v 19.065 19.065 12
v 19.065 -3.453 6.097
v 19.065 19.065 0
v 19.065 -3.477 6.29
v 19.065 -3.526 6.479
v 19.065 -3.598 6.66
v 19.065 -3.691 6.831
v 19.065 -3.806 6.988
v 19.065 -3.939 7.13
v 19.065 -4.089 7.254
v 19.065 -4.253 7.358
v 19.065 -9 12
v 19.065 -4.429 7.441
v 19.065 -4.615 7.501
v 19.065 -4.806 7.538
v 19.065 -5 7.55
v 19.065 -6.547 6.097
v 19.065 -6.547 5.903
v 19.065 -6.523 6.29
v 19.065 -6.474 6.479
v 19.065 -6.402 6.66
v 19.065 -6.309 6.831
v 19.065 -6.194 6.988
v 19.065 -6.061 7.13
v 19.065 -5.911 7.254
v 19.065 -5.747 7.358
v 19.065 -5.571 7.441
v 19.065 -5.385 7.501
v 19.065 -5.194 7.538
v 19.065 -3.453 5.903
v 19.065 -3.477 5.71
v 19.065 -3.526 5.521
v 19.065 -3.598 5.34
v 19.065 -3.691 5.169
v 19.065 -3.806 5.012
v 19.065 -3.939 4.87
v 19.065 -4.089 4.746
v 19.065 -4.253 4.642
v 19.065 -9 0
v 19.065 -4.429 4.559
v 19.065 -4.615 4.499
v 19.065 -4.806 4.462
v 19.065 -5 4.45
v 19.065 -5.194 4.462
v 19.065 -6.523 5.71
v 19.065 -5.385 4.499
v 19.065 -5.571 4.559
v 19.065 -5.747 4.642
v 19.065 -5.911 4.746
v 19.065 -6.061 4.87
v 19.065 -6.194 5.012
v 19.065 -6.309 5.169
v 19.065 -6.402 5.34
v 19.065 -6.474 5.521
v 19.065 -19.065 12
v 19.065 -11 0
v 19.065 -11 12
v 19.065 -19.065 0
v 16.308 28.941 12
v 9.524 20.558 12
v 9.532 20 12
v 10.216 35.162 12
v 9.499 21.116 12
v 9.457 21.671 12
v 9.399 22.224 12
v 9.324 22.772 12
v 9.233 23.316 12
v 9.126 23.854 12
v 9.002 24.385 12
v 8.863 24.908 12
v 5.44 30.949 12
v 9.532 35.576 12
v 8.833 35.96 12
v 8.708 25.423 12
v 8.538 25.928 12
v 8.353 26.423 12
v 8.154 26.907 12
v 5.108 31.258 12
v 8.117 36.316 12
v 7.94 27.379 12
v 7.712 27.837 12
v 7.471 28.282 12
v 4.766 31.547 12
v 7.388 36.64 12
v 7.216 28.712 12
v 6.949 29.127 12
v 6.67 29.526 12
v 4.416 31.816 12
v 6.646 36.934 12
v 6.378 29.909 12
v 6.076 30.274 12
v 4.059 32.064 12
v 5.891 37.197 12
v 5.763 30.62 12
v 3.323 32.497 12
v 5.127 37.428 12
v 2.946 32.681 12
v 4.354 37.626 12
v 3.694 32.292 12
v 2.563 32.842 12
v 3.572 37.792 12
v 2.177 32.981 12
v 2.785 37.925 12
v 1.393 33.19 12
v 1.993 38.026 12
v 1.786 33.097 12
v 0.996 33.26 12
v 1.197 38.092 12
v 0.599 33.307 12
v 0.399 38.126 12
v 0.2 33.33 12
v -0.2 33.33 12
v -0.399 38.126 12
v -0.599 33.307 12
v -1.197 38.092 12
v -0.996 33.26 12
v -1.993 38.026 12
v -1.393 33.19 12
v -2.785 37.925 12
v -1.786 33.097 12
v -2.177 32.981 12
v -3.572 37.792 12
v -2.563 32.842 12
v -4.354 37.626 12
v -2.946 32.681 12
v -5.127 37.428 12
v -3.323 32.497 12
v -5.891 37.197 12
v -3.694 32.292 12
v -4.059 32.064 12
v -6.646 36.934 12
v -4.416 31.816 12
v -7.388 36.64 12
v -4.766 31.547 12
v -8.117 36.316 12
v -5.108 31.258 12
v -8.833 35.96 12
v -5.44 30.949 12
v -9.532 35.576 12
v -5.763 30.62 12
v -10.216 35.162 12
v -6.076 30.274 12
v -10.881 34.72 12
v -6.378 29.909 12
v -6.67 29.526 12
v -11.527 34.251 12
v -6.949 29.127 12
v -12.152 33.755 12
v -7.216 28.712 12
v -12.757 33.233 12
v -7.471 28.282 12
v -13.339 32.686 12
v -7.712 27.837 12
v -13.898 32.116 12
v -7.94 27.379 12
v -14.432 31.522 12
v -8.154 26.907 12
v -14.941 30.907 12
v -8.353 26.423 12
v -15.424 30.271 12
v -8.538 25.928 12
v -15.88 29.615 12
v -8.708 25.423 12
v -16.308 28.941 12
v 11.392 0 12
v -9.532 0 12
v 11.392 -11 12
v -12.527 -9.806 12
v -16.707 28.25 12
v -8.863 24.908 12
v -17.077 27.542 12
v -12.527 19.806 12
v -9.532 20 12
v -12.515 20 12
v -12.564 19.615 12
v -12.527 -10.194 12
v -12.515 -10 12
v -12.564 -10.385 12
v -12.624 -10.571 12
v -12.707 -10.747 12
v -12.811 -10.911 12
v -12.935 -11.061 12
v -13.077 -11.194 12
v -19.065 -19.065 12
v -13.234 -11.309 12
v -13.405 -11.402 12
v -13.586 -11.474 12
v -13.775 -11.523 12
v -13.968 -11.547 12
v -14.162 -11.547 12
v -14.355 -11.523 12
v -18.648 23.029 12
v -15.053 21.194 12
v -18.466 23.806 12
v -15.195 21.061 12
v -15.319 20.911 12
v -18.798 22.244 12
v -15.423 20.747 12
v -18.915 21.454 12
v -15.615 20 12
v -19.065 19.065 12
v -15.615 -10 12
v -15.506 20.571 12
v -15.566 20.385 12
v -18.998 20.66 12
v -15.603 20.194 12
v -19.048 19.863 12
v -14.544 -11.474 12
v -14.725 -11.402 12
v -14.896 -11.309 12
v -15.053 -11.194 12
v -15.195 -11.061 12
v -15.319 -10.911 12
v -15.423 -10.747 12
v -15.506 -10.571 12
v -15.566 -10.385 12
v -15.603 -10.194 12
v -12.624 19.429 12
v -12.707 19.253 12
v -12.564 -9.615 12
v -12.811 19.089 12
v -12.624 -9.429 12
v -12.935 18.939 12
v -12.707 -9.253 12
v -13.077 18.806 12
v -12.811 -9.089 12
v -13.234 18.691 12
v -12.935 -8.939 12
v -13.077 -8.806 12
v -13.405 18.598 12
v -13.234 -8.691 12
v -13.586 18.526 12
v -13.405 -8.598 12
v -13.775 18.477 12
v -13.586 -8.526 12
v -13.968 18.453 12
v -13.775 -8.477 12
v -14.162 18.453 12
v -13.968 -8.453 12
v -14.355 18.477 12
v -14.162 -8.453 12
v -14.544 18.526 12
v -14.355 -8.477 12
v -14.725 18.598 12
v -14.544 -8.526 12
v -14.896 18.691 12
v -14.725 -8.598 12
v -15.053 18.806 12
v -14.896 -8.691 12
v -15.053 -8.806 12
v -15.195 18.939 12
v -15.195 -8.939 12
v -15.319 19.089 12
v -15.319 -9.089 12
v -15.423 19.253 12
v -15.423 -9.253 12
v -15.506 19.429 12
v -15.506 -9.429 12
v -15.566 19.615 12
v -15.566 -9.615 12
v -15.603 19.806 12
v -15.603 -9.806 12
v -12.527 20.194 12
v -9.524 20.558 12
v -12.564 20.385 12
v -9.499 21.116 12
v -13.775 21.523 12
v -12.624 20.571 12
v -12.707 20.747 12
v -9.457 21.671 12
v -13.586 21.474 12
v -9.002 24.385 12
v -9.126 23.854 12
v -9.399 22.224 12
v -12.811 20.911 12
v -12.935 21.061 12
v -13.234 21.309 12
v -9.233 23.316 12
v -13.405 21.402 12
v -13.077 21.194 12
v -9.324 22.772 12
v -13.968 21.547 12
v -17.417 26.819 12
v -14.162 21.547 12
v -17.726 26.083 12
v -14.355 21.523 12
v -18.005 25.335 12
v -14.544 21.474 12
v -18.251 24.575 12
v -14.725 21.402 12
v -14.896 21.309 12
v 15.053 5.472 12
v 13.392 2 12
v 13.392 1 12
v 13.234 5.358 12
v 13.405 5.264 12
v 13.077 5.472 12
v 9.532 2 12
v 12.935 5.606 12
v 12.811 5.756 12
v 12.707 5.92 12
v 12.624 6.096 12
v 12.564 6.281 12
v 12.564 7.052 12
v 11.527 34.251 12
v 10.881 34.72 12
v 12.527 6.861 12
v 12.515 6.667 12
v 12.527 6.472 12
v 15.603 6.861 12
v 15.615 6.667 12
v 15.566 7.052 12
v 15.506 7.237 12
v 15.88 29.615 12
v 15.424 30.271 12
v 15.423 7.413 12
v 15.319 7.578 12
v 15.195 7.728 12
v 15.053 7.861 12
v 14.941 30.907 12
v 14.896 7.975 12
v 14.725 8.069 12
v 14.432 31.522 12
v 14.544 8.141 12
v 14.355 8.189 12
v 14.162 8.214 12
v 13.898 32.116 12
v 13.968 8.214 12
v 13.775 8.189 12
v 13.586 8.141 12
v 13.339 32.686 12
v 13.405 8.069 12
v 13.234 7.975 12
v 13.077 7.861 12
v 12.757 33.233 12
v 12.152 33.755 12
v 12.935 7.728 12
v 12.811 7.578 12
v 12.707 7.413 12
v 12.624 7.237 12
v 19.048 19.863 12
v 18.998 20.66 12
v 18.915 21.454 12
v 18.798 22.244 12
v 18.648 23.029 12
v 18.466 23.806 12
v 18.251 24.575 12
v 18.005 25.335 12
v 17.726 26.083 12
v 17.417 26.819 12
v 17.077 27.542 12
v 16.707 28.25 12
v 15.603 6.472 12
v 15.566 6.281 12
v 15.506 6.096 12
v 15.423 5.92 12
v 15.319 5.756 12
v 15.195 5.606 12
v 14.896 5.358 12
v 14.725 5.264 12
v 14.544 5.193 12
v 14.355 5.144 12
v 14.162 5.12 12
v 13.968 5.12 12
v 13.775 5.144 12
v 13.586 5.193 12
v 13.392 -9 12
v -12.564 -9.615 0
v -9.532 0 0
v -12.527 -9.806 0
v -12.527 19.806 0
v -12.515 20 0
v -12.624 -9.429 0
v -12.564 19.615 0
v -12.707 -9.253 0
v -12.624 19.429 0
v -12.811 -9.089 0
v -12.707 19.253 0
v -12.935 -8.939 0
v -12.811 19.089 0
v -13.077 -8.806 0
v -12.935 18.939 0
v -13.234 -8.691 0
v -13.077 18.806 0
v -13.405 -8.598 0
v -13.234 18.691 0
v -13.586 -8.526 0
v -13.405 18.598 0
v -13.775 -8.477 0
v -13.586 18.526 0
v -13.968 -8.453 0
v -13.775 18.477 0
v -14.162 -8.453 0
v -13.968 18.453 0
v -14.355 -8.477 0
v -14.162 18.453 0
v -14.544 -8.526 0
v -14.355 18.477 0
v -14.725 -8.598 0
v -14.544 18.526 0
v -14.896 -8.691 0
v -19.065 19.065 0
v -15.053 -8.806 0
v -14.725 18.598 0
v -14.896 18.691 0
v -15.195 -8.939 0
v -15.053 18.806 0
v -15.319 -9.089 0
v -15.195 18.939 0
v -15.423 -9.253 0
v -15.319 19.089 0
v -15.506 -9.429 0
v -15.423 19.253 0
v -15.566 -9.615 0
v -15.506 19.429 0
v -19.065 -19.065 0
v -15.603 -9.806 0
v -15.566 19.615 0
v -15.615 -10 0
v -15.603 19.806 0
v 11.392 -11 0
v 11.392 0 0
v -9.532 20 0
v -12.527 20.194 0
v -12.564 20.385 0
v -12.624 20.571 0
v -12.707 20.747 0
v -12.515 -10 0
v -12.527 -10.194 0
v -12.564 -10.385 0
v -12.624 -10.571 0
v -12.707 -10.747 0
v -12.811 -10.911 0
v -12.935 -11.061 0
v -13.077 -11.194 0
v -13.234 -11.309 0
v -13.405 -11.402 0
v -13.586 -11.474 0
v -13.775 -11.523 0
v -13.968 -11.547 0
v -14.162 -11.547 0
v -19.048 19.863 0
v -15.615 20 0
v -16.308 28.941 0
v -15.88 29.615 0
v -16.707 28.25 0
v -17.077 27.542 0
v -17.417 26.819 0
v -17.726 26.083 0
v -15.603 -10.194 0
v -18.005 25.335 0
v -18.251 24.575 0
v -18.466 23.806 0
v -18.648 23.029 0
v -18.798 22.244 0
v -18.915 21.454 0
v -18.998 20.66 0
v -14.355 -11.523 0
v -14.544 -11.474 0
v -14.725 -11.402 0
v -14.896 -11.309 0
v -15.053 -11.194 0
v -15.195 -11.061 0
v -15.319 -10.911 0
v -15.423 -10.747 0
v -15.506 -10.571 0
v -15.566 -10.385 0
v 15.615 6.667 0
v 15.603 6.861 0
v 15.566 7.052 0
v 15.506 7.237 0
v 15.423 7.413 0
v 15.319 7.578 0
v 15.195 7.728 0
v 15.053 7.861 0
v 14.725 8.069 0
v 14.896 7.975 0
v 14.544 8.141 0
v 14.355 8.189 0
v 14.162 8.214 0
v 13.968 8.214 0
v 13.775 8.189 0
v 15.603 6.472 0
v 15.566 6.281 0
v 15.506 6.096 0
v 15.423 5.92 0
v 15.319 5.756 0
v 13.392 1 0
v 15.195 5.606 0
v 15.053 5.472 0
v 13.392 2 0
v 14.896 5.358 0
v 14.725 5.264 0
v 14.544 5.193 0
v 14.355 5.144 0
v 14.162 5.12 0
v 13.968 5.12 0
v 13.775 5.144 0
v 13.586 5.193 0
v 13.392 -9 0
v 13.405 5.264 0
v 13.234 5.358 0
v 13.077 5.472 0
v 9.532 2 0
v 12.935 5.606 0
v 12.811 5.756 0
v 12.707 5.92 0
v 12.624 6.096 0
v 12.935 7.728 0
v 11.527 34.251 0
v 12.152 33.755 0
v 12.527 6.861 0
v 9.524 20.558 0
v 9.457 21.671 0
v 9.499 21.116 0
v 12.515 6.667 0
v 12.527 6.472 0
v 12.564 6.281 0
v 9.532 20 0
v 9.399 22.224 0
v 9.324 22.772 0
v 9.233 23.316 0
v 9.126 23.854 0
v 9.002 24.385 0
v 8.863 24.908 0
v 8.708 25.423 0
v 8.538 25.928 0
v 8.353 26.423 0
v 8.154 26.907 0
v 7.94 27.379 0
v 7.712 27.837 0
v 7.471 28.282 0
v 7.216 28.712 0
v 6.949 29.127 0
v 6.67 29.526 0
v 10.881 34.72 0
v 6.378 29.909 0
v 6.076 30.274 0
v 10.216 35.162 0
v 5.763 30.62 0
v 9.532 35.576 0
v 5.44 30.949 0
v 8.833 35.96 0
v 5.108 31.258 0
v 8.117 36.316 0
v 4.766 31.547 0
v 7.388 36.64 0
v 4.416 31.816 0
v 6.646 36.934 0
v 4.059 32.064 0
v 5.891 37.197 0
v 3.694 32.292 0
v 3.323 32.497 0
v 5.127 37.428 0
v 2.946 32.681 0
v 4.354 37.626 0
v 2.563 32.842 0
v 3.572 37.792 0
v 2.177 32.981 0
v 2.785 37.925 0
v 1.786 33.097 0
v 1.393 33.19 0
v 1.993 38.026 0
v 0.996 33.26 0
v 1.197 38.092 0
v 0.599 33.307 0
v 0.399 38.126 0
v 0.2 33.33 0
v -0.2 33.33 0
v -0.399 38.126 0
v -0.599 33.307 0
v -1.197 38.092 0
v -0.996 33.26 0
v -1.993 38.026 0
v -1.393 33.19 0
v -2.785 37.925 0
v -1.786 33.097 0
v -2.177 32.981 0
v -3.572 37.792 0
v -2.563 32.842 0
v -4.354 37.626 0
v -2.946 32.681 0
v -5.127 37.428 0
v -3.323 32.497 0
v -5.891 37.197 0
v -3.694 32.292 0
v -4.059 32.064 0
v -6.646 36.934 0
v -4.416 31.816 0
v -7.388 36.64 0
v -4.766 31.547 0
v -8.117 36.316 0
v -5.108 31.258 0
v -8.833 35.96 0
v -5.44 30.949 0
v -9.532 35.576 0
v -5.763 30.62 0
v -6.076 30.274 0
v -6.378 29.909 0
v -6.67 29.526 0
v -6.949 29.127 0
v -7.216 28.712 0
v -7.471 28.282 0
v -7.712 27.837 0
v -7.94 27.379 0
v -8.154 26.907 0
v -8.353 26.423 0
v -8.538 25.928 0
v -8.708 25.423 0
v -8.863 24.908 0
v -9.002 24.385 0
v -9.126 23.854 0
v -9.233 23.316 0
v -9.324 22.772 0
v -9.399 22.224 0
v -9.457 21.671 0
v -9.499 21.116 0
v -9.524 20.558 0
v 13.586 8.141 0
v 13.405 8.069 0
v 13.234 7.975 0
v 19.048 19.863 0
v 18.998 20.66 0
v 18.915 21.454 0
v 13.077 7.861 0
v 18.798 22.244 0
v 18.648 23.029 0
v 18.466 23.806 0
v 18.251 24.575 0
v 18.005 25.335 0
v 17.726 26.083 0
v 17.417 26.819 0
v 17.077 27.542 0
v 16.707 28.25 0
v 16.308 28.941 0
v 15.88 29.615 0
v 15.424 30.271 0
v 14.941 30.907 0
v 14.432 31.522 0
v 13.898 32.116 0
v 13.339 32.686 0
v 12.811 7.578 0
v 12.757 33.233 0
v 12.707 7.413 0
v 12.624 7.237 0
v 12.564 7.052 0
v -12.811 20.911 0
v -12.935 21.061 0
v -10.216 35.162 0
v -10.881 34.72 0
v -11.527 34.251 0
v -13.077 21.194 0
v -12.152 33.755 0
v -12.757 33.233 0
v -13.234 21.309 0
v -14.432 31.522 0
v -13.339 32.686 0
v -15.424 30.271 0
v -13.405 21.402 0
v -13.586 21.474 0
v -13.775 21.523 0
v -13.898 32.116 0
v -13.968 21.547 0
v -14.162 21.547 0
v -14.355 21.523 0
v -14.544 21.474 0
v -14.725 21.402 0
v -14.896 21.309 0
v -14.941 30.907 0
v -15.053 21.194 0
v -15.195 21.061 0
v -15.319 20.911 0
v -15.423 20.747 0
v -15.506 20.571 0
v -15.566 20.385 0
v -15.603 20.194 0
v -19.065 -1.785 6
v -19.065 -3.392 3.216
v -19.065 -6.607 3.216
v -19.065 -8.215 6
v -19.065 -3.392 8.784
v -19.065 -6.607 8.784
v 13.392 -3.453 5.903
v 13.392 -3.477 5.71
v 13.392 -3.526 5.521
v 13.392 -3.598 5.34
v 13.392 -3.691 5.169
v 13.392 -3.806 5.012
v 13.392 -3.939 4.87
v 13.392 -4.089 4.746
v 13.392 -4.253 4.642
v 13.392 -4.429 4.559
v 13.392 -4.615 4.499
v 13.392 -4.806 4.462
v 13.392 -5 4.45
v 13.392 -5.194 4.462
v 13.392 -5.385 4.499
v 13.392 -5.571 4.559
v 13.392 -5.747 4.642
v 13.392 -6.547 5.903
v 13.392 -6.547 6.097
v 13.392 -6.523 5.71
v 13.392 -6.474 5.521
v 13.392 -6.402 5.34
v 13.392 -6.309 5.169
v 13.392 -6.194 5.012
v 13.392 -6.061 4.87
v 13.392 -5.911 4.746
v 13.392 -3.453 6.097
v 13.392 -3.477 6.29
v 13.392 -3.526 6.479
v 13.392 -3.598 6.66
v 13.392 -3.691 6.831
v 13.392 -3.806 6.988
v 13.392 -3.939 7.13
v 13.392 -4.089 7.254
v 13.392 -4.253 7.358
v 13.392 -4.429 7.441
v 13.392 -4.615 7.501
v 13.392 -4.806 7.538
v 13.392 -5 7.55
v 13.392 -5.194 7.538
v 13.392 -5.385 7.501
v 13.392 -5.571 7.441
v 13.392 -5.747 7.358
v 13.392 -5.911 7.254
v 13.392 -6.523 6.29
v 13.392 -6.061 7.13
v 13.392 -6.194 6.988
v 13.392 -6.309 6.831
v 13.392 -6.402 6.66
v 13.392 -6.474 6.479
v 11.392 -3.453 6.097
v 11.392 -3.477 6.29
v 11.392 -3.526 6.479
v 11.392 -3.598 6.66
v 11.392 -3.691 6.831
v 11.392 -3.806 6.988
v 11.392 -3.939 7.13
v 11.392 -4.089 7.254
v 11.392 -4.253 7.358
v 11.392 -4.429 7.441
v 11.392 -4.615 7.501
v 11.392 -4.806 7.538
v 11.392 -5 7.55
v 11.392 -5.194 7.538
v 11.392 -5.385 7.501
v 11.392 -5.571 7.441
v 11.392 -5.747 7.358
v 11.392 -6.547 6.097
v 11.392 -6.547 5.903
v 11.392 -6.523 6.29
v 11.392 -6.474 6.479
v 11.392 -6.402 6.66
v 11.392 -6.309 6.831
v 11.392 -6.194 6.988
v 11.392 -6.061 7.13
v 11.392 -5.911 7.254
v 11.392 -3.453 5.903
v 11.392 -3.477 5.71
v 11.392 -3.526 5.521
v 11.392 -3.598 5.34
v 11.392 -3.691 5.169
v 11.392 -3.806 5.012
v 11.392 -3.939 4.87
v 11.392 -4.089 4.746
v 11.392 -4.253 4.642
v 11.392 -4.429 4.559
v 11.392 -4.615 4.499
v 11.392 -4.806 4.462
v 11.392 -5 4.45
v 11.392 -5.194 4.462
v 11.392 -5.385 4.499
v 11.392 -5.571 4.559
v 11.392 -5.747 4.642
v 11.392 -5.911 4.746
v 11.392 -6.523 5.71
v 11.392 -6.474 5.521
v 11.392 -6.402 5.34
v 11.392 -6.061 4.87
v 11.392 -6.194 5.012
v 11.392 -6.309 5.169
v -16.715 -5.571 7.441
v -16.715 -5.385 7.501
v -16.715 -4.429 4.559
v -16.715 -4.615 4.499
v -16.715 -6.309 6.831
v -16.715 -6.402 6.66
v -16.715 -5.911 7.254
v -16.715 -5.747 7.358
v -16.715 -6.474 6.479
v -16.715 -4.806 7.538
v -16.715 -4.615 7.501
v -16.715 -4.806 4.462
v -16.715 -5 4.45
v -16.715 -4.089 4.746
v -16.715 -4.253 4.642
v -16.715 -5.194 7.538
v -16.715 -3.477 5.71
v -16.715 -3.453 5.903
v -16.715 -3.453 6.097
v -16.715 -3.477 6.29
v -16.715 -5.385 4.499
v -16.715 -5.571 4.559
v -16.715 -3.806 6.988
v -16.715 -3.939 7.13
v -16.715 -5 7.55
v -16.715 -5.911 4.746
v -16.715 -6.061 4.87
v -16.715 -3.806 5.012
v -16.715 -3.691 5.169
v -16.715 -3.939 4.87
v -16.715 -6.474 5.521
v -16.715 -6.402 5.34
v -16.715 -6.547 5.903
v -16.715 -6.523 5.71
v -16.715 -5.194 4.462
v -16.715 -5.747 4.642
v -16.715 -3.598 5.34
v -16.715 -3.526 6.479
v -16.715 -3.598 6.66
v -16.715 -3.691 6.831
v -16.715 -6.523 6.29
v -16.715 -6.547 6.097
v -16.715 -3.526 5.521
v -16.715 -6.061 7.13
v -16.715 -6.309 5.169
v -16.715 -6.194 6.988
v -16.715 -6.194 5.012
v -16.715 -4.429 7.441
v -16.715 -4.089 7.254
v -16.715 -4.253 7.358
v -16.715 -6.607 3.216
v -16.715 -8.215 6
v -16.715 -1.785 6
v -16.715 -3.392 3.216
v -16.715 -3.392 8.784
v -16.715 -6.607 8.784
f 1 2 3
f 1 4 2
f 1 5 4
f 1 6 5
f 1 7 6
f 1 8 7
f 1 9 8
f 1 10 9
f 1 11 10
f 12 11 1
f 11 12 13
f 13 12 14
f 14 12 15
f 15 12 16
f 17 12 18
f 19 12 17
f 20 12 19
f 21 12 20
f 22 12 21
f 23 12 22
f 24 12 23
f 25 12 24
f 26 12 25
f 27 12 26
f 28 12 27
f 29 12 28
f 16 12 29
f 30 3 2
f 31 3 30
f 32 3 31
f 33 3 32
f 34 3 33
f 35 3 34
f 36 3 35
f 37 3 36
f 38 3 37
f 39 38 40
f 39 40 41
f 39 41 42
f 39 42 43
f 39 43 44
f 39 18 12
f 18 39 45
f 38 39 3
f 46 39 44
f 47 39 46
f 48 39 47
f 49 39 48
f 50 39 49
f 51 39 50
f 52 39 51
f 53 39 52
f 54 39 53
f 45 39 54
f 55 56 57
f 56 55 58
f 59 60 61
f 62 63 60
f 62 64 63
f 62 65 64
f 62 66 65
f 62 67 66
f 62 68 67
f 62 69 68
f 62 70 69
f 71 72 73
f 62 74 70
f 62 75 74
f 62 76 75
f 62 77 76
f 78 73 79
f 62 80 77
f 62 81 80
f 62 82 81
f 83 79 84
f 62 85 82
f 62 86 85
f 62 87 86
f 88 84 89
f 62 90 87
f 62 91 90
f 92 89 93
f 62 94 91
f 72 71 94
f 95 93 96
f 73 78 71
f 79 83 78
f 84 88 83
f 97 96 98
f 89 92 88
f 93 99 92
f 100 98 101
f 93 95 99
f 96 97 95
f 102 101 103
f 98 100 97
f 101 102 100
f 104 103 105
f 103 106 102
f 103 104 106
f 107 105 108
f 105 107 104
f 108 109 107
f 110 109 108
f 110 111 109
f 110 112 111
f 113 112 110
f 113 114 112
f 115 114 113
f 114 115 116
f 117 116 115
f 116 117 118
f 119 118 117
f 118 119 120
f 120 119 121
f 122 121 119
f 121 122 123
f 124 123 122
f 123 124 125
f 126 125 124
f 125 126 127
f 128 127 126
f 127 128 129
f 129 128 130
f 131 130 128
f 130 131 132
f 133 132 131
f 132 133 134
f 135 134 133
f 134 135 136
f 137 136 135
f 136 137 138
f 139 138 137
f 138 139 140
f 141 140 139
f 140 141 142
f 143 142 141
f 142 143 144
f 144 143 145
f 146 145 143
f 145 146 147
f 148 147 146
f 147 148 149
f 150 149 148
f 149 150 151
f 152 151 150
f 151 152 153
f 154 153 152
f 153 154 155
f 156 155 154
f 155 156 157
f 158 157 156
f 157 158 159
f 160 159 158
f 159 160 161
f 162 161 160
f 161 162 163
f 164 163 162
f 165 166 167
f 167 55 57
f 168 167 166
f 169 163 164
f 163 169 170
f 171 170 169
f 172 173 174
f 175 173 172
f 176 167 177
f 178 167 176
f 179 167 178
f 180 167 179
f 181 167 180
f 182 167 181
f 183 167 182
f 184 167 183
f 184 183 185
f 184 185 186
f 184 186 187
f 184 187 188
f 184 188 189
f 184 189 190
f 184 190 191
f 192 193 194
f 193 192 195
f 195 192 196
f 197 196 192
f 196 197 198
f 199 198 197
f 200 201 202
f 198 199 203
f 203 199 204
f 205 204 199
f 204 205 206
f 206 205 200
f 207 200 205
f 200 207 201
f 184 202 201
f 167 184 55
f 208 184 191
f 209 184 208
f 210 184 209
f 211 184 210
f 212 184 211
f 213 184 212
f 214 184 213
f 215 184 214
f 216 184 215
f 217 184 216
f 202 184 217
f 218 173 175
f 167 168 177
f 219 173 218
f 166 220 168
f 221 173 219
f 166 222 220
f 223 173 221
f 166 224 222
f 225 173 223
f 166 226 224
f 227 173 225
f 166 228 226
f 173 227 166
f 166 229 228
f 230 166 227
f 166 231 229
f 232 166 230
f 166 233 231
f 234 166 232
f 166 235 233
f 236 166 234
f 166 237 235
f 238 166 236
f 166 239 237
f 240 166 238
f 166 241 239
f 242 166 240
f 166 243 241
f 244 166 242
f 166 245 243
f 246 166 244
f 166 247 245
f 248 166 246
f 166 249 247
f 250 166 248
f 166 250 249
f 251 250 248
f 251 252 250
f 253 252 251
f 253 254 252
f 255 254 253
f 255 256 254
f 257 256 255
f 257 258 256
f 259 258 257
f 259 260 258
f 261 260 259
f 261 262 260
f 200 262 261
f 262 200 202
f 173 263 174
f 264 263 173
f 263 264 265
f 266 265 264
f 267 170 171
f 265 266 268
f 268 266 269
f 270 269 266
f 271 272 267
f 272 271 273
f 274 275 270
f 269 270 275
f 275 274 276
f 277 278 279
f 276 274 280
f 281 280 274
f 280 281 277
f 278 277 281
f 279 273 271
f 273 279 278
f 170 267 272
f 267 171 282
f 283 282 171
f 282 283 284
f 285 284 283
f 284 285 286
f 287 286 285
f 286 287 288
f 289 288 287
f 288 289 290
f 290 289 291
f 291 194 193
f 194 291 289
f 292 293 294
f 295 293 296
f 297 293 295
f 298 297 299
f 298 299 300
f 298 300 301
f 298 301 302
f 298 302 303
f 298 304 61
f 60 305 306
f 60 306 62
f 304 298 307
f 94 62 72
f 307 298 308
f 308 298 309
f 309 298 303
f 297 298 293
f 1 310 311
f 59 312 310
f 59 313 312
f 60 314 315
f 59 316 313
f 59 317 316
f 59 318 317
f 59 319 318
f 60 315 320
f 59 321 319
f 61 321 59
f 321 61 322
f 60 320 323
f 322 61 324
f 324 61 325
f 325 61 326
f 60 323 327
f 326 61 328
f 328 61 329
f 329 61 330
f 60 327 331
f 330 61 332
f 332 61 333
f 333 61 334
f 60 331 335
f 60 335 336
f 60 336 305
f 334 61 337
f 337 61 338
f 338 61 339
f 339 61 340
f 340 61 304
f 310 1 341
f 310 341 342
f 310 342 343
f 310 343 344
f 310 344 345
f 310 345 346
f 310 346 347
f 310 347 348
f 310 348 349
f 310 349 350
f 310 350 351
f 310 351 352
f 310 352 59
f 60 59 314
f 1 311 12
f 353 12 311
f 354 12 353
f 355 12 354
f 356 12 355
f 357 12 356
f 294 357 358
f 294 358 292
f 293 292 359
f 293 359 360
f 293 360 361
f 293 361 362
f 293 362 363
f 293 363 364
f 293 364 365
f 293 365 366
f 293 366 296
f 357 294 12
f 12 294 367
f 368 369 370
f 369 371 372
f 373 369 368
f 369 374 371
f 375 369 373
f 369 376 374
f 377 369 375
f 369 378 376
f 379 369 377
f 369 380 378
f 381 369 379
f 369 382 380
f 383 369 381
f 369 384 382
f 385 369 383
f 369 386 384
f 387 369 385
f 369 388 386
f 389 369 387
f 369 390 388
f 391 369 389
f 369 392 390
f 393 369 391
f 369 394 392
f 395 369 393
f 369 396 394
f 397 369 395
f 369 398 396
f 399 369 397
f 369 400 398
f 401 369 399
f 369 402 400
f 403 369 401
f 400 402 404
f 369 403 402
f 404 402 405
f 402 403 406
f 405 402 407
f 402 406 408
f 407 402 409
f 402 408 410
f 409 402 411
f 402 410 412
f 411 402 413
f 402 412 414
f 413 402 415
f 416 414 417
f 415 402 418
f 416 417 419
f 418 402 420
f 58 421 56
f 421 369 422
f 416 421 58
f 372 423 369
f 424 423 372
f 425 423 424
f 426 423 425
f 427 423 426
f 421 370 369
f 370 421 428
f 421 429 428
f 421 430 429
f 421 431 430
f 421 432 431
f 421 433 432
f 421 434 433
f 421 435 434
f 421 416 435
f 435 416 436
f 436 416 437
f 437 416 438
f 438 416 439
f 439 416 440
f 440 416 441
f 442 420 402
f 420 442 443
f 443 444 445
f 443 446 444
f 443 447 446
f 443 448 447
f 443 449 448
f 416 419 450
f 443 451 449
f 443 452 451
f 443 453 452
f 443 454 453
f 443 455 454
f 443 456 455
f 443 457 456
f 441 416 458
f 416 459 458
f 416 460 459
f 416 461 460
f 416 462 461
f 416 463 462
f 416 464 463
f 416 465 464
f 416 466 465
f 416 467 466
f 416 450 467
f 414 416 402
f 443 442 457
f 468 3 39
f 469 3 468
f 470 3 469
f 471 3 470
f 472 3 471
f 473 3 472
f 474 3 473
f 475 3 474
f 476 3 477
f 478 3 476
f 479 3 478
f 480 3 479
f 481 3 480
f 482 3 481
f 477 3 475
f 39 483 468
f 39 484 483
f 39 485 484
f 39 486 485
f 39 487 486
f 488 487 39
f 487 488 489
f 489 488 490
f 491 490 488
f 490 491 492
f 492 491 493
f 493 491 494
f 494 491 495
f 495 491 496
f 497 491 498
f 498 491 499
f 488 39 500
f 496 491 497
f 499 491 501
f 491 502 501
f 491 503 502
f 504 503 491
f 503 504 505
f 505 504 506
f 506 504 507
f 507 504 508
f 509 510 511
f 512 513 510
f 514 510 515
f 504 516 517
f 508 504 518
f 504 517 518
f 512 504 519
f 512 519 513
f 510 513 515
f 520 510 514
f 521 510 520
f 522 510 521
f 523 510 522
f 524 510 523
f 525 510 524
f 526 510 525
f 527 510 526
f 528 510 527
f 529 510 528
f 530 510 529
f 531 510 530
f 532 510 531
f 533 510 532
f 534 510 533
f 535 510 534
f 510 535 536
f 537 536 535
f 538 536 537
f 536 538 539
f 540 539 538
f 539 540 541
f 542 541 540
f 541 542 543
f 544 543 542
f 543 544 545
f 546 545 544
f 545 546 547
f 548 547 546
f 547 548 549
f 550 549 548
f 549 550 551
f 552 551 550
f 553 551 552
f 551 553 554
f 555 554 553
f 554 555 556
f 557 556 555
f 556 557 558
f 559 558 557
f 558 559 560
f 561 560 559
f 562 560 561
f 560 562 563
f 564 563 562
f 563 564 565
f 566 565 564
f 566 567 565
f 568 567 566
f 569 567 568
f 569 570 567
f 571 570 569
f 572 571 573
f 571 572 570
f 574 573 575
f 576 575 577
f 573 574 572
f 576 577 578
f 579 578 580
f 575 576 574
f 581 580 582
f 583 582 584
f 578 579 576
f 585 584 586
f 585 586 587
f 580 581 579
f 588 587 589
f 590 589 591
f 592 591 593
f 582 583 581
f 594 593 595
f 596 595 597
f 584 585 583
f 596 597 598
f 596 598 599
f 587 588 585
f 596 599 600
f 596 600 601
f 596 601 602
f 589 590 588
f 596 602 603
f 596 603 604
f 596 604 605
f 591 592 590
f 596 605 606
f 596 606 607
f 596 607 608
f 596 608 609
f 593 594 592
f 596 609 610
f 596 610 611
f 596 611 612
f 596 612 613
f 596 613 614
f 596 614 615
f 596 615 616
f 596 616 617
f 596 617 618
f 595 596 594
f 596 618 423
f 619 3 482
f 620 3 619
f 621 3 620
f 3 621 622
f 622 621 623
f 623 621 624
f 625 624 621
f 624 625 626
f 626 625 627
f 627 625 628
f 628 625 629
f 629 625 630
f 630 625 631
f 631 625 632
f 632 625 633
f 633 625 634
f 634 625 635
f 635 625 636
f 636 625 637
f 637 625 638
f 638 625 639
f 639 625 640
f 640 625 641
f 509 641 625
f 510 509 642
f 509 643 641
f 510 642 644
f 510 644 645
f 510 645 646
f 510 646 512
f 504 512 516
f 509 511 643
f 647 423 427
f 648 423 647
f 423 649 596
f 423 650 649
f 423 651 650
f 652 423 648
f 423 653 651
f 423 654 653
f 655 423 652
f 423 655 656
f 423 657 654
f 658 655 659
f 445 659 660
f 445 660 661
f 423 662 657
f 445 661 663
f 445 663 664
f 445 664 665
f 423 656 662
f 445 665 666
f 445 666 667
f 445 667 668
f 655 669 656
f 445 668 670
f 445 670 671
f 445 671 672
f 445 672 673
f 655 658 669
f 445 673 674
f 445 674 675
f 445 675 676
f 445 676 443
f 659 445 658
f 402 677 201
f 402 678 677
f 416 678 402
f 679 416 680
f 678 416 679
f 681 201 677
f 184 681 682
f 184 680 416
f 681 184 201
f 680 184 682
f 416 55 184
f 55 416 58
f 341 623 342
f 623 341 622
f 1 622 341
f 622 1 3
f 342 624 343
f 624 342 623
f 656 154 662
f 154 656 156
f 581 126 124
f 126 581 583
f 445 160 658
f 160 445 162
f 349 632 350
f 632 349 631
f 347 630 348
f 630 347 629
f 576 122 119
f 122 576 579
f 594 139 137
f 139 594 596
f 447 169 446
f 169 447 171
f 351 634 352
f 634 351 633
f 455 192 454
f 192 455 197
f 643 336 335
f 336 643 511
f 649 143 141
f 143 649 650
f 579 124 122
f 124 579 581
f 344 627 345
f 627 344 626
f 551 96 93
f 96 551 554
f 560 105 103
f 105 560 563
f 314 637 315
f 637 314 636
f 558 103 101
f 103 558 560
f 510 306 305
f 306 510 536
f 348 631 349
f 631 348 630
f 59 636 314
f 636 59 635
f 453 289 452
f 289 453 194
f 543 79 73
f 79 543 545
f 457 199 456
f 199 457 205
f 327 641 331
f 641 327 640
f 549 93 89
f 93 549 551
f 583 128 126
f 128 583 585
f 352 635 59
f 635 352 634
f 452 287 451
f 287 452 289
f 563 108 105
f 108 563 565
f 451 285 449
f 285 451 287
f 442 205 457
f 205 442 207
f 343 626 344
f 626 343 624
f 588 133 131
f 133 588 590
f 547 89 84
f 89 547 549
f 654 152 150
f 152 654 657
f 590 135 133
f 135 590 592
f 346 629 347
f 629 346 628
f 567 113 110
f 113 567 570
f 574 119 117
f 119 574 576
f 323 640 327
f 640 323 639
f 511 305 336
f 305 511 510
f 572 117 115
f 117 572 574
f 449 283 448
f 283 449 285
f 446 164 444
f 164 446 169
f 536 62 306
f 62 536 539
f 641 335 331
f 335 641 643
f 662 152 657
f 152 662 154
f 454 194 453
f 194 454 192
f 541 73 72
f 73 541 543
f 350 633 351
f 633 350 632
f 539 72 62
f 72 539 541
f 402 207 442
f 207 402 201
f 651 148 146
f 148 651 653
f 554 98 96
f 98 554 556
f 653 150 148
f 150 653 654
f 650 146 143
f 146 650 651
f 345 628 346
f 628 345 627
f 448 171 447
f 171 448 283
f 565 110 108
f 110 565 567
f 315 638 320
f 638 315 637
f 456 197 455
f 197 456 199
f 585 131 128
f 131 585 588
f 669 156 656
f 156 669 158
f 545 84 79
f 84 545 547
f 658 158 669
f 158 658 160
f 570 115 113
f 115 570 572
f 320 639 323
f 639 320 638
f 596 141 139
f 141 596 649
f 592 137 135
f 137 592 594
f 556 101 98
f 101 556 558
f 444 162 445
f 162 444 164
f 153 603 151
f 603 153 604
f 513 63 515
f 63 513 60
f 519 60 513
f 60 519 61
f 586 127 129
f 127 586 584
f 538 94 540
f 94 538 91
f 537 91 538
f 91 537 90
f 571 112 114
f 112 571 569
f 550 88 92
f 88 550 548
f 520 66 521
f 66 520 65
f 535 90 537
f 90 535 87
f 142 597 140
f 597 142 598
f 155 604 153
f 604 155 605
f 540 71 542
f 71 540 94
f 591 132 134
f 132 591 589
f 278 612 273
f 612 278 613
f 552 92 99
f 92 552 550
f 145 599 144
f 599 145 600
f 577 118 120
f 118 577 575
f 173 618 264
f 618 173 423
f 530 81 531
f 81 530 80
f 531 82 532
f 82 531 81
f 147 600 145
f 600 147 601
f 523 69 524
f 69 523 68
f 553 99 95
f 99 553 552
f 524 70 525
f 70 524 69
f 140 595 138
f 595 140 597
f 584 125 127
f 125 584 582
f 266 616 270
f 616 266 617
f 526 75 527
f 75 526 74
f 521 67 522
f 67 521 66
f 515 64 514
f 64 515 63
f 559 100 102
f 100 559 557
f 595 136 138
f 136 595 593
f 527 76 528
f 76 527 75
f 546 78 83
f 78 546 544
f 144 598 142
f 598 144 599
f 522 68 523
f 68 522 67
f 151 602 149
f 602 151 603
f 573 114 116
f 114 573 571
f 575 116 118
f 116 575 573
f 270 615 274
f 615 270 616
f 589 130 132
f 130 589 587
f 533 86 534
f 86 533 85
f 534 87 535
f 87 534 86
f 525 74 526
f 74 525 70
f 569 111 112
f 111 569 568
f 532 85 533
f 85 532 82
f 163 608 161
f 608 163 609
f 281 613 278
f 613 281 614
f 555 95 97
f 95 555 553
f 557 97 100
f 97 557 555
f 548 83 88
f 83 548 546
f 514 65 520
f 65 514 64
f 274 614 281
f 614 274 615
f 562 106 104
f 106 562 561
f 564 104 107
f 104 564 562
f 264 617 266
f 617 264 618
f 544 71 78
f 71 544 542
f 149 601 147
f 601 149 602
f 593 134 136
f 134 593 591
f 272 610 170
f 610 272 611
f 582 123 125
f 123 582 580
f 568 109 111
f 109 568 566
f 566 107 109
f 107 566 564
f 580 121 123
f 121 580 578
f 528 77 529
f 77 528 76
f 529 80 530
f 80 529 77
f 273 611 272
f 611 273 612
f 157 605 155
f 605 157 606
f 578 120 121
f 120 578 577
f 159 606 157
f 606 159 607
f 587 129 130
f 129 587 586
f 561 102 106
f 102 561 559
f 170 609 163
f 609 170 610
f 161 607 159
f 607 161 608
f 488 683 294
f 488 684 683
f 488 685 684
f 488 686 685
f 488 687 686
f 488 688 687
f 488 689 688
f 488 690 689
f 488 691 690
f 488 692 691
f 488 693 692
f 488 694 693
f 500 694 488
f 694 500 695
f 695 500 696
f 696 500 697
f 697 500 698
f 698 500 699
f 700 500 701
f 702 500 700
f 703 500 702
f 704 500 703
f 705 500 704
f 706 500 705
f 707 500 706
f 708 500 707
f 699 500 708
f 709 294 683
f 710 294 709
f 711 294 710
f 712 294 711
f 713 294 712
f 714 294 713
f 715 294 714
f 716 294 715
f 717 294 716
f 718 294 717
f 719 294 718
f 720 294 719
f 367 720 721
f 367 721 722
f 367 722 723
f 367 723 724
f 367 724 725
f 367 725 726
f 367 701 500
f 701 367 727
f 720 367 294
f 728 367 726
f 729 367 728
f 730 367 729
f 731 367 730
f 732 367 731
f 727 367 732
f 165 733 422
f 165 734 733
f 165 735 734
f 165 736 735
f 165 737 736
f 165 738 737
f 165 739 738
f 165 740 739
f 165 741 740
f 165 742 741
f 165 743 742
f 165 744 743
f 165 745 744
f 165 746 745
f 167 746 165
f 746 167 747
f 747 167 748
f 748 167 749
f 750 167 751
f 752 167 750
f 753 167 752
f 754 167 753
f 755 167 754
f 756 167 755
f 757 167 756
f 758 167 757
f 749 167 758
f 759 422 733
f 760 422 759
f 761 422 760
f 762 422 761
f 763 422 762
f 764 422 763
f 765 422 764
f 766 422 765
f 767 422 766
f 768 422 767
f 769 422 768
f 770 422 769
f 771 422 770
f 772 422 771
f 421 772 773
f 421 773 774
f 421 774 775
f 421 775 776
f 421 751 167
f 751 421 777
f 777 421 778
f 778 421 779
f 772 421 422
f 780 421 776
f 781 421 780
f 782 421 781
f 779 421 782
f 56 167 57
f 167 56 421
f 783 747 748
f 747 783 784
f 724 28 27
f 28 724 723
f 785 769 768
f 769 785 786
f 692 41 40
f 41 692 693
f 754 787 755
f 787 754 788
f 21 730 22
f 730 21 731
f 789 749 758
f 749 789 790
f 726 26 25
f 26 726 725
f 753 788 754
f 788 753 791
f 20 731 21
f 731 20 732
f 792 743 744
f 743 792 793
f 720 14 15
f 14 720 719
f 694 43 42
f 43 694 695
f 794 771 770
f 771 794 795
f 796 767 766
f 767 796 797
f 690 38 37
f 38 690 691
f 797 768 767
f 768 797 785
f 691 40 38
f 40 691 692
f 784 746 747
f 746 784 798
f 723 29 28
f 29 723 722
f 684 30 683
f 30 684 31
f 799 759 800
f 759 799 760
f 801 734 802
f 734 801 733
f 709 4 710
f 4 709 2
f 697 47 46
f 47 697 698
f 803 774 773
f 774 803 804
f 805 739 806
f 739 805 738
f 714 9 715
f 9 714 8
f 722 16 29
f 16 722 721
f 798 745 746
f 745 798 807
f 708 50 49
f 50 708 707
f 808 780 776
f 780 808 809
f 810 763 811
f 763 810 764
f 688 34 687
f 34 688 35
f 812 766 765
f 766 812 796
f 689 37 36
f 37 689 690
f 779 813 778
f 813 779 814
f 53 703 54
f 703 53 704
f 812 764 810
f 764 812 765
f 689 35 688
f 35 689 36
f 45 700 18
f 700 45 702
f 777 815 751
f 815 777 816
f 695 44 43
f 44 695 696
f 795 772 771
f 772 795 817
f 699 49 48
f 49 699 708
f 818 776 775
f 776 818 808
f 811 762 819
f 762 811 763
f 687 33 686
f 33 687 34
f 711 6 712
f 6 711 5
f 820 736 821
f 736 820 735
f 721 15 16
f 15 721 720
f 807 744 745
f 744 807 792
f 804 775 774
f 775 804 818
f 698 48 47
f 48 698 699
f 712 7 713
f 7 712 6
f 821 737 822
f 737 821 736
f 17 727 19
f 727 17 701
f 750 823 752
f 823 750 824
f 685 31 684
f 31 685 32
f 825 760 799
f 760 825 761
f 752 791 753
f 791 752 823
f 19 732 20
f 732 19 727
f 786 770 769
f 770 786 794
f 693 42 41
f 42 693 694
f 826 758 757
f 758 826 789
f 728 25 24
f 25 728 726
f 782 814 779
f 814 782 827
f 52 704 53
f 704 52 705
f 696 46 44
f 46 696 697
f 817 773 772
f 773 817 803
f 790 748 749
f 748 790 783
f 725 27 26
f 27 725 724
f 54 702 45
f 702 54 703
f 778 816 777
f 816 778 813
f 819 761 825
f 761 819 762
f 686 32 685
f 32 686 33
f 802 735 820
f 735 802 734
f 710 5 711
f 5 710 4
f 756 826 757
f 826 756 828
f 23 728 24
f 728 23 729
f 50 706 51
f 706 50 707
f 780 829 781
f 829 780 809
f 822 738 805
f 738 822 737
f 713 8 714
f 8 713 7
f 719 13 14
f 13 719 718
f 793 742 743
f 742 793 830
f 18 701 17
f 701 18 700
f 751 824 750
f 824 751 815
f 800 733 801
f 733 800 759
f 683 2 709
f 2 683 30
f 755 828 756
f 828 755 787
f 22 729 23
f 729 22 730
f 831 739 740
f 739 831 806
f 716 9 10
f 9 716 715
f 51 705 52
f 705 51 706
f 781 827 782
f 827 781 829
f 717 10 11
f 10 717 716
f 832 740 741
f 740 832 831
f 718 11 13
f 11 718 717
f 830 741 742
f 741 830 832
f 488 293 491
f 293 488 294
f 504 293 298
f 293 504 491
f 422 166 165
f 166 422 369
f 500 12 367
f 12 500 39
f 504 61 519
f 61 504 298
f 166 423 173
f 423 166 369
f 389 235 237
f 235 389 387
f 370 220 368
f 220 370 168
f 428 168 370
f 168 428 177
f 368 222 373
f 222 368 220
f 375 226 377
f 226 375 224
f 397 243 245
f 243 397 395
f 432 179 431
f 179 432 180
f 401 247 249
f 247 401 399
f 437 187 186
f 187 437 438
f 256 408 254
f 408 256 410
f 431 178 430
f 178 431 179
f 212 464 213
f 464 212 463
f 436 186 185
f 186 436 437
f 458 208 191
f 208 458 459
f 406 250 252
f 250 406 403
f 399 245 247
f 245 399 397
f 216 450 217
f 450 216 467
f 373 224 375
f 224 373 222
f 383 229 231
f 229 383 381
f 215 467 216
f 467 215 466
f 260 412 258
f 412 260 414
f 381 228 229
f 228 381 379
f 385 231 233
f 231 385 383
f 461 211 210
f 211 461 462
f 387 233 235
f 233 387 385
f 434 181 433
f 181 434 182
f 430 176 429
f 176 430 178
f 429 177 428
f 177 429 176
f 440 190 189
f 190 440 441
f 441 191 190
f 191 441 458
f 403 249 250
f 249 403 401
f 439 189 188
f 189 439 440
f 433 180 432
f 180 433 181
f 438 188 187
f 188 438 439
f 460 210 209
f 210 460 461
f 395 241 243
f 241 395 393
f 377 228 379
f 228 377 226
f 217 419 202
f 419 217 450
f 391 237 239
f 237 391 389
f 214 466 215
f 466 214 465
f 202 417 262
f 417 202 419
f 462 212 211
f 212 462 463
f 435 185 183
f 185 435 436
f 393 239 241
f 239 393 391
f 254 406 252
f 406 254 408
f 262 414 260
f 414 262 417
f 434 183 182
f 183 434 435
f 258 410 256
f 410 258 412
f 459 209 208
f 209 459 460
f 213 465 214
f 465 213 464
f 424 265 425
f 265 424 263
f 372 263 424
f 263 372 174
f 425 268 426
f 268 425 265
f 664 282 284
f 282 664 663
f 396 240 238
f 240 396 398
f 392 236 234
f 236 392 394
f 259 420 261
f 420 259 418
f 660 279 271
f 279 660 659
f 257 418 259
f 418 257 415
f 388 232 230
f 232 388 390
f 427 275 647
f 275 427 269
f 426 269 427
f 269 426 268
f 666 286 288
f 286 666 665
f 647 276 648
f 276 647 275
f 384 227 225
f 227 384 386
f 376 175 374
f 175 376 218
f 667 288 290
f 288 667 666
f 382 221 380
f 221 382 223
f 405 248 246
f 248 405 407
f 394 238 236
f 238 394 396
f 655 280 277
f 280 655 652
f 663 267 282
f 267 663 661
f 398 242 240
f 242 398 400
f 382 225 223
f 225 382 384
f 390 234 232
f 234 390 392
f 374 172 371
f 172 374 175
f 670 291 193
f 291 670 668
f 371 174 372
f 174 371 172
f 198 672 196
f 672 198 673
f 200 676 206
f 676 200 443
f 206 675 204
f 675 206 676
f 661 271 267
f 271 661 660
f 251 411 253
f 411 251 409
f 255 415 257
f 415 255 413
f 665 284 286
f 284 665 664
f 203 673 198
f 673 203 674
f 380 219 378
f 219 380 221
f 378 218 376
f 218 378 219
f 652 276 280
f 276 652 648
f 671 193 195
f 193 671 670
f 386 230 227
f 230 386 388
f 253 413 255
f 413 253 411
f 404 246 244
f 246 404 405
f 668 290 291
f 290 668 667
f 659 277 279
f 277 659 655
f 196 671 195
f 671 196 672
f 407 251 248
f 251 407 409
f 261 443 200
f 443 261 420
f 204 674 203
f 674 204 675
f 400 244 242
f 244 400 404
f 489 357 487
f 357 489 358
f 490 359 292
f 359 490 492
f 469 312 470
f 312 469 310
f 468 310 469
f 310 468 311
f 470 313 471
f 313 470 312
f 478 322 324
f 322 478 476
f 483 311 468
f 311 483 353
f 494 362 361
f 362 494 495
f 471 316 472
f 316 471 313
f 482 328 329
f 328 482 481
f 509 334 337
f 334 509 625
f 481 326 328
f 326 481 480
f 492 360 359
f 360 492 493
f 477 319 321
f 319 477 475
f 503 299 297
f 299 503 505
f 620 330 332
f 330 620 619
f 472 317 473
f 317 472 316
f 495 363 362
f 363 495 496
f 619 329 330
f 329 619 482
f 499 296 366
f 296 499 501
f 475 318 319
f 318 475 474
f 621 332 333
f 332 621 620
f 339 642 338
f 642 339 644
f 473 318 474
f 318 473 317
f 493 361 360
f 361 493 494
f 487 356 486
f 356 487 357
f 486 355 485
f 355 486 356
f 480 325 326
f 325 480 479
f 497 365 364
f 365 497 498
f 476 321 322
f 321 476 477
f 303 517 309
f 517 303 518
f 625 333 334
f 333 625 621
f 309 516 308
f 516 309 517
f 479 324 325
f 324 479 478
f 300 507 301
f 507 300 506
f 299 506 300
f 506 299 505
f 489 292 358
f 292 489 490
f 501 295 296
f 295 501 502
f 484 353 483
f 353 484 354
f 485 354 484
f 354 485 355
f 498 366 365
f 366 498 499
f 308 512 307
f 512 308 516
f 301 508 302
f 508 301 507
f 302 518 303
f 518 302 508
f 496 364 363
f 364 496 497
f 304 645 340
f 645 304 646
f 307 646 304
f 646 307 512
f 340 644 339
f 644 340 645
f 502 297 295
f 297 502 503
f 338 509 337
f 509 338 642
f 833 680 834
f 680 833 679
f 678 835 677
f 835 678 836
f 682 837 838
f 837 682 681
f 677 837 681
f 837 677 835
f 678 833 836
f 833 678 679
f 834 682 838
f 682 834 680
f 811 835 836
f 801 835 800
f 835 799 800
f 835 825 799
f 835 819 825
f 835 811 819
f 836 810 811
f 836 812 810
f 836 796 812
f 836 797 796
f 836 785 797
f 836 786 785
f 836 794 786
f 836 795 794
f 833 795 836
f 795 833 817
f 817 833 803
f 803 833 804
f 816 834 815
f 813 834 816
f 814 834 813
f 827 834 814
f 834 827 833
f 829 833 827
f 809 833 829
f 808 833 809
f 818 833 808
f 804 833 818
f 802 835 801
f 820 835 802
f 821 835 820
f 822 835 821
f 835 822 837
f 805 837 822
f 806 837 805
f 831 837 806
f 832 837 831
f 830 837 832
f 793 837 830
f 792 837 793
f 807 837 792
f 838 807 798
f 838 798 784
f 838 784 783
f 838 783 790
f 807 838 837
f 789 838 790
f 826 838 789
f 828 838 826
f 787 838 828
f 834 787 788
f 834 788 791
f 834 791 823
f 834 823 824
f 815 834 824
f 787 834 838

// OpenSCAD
// Cerberus Pup-style carriage for Kossel, compatible with Kossel Mini/Pro linear rails

// Steve Graber made the original design.
// Daniel Akesson converted the original into OpenSCAD.
// Brandon Heller tweaked the OpenSCAD to:
// - be compatible with linear rails (thicker, w/20x20 m3 mounting grid)
// - decouple rod mounts from the carriage, and be compatible with the Kosssel effector.

// Kossel Pro and Mini ball rails equivalent to HIWIN Model MGN 12H:
// http://hiwin.com/html/extras/mgn-c_mgn-h.html
// Distance from ball rail attachment plane to outer face of slider, marked H.
ball_rail_H = 13;

// This is the key dimension to enable rail compatibility.
// With the Graber double-623 V-wheels, an m3 nut plus a washer gives ~1mm of clearance.
carriage_extrusion_dist = 1;
main_height = ball_rail_H - carriage_extrusion_dist;

// Presumably, this carriage will ride on an extrusion.
// Measured width of OpenBeam, slightly less than actual 15mm.
extrusion_width = 14.90;
roller_dia = 15.57;  // Measured diameter of 3 different Grabercars double 623 w-wheels.
roller_r = roller_dia / 2;
// Using calipers, measure from the edge of the extrusion to side of the wheel.
// This dimension must be slightly less than the sum of the extrusion width + roller dia. 
wheel_extrusion_len = 29.60;
// extra_squeeze helps to ensure that the rollers makes contact with the beam
// before tightening the tensioning screw, even if any measurements are off,
// screw holes for the rollers are drilled at a skewed angle, or screw holes are
// slightly enlarged and enable the screws to splay out a bit under tension.
// The ~2mm of screw adjustment from the slot is not a lot, and it's better
// to have the beam w/the single roller stretch out than to not get enough
// tension.
extra_squeeze = 0.3;
roller_x_offset = wheel_extrusion_len - roller_r - (extrusion_width / 2) - extra_squeeze;
beam_width = 10.0;
main_cube_width = (roller_x_offset + beam_width / 2) * 2;
main_cube_length = 40;
rod_fastener_height = 10 + main_height;
rod_fastener_width = 14;
rod_fastener_length = 9;

round_r = 3.8;
pad = 0.1;
smooth = 50;
main_curve_smooth = 150;

rod_offset = 3;

bearing_inset = 1.5;

cut_width = 2;  // Width of cut
minimal_cut = (main_cube_width/4)*0.3;  // Larger values move the main cut (in the y dir) outwards.
rest_cut = (main_cube_width/4)*0.7; // Distance to make the cut that exits the outside of the carriage.

m3_nut_slop = 0.25;  // Account for inability for layer height to exactly match nut width.
m3_nut_dia = 6.18 + m3_nut_slop;
m3_nut_r = m3_nut_dia / 2;
m3_nut_thickness = 2.35;

m3_screw_slop = 0.1;
m3_screw_dia = 3.0 + m3_screw_slop;
m3_screw_r = m3_screw_dia / 2;
m3_screw_head_slop = 0.3;
m3_screw_head_r = 5.5/2 + m3_screw_head_slop;

delta = 0.01;  // Small value to avoid visual artifacts for coincident surfaces.

module oval(w,h, height, center = false) {
  scale([1, h/w, 1]) cylinder(h=height, r=w, $fn=main_curve_smooth, center=center);
}

module main_part()
{
  cube([main_cube_width, main_cube_width, main_height], center = true);
  translate([0, main_cube_width/2, 0]) {
    cylinder(r=main_cube_width/2, h=main_height, $fn=main_curve_smooth, center = true);
  }
}

module cut()
{
  translate([main_cube_width/4+minimal_cut/2, cut_width/2, 0]) {
    cube([minimal_cut+cut_width, cut_width, main_height + 2], center = true);
  }
  translate([main_cube_width/4+minimal_cut, -main_cube_length/8, 0]) {
    cube([cut_width, main_cube_length/4+cut_width, main_height + 2], center = true);
    rotate([0, 90, 0]) {
      cylinder(r=m3_screw_r, h=100, $fn=smooth, center = true);
    }
  }
  translate([main_cube_width/4+rest_cut, -main_cube_length/4, 0]) {
    cube([rest_cut, cut_width, main_height + 2], center = true);
  }
}

module main_carriage()
{
  translate([0, 0 , (main_height)/2]) {
    difference() {
      main_part();
      translate([0, main_cube_length/4, 0]) {
        cube([main_cube_width/2, main_cube_length/2, main_height + 2], center = true);
      }
      translate([0, main_cube_length/2, 0]) {
        cylinder(r=main_cube_width/4, h=main_height + 2, $fn=smooth, center = true);
        oval(main_cube_width/4, main_cube_length/3, main_height + 2, $fn=smooth, center = true);
      }
      // Hole for roller closest to the corner
      translate([-roller_x_offset, -main_cube_length/4, 0]) {
        cylinder(r=m3_screw_r, h=100, $fn=smooth, center = true);
      }

      // Hole for roller farthest from rod holders, on side w/2 rollers
      translate([-roller_x_offset, main_cube_length/2, 0]) {
        cylinder(r=m3_screw_r, h=100, $fn=smooth, center = true);
      }
      // Hole for roller on side w/1 roller
      translate([roller_x_offset, (main_cube_length/3)/2, 0]) {
        cylinder(r=m3_screw_r, h=100, $fn=smooth, center = true);
      }

      cut();

      // Nut trap for tensioning screw
      translate([-roller_x_offset - beam_width / 2 + m3_nut_thickness, -main_cube_length/8, 0]) {
        rotate([30, 0, 0]) rotate([0, 270, 0]) {
          cylinder(r=m3_nut_r, h=m3_nut_thickness + delta, $fn=6);
        }
      }
    }
  }
}

main_carriage();
